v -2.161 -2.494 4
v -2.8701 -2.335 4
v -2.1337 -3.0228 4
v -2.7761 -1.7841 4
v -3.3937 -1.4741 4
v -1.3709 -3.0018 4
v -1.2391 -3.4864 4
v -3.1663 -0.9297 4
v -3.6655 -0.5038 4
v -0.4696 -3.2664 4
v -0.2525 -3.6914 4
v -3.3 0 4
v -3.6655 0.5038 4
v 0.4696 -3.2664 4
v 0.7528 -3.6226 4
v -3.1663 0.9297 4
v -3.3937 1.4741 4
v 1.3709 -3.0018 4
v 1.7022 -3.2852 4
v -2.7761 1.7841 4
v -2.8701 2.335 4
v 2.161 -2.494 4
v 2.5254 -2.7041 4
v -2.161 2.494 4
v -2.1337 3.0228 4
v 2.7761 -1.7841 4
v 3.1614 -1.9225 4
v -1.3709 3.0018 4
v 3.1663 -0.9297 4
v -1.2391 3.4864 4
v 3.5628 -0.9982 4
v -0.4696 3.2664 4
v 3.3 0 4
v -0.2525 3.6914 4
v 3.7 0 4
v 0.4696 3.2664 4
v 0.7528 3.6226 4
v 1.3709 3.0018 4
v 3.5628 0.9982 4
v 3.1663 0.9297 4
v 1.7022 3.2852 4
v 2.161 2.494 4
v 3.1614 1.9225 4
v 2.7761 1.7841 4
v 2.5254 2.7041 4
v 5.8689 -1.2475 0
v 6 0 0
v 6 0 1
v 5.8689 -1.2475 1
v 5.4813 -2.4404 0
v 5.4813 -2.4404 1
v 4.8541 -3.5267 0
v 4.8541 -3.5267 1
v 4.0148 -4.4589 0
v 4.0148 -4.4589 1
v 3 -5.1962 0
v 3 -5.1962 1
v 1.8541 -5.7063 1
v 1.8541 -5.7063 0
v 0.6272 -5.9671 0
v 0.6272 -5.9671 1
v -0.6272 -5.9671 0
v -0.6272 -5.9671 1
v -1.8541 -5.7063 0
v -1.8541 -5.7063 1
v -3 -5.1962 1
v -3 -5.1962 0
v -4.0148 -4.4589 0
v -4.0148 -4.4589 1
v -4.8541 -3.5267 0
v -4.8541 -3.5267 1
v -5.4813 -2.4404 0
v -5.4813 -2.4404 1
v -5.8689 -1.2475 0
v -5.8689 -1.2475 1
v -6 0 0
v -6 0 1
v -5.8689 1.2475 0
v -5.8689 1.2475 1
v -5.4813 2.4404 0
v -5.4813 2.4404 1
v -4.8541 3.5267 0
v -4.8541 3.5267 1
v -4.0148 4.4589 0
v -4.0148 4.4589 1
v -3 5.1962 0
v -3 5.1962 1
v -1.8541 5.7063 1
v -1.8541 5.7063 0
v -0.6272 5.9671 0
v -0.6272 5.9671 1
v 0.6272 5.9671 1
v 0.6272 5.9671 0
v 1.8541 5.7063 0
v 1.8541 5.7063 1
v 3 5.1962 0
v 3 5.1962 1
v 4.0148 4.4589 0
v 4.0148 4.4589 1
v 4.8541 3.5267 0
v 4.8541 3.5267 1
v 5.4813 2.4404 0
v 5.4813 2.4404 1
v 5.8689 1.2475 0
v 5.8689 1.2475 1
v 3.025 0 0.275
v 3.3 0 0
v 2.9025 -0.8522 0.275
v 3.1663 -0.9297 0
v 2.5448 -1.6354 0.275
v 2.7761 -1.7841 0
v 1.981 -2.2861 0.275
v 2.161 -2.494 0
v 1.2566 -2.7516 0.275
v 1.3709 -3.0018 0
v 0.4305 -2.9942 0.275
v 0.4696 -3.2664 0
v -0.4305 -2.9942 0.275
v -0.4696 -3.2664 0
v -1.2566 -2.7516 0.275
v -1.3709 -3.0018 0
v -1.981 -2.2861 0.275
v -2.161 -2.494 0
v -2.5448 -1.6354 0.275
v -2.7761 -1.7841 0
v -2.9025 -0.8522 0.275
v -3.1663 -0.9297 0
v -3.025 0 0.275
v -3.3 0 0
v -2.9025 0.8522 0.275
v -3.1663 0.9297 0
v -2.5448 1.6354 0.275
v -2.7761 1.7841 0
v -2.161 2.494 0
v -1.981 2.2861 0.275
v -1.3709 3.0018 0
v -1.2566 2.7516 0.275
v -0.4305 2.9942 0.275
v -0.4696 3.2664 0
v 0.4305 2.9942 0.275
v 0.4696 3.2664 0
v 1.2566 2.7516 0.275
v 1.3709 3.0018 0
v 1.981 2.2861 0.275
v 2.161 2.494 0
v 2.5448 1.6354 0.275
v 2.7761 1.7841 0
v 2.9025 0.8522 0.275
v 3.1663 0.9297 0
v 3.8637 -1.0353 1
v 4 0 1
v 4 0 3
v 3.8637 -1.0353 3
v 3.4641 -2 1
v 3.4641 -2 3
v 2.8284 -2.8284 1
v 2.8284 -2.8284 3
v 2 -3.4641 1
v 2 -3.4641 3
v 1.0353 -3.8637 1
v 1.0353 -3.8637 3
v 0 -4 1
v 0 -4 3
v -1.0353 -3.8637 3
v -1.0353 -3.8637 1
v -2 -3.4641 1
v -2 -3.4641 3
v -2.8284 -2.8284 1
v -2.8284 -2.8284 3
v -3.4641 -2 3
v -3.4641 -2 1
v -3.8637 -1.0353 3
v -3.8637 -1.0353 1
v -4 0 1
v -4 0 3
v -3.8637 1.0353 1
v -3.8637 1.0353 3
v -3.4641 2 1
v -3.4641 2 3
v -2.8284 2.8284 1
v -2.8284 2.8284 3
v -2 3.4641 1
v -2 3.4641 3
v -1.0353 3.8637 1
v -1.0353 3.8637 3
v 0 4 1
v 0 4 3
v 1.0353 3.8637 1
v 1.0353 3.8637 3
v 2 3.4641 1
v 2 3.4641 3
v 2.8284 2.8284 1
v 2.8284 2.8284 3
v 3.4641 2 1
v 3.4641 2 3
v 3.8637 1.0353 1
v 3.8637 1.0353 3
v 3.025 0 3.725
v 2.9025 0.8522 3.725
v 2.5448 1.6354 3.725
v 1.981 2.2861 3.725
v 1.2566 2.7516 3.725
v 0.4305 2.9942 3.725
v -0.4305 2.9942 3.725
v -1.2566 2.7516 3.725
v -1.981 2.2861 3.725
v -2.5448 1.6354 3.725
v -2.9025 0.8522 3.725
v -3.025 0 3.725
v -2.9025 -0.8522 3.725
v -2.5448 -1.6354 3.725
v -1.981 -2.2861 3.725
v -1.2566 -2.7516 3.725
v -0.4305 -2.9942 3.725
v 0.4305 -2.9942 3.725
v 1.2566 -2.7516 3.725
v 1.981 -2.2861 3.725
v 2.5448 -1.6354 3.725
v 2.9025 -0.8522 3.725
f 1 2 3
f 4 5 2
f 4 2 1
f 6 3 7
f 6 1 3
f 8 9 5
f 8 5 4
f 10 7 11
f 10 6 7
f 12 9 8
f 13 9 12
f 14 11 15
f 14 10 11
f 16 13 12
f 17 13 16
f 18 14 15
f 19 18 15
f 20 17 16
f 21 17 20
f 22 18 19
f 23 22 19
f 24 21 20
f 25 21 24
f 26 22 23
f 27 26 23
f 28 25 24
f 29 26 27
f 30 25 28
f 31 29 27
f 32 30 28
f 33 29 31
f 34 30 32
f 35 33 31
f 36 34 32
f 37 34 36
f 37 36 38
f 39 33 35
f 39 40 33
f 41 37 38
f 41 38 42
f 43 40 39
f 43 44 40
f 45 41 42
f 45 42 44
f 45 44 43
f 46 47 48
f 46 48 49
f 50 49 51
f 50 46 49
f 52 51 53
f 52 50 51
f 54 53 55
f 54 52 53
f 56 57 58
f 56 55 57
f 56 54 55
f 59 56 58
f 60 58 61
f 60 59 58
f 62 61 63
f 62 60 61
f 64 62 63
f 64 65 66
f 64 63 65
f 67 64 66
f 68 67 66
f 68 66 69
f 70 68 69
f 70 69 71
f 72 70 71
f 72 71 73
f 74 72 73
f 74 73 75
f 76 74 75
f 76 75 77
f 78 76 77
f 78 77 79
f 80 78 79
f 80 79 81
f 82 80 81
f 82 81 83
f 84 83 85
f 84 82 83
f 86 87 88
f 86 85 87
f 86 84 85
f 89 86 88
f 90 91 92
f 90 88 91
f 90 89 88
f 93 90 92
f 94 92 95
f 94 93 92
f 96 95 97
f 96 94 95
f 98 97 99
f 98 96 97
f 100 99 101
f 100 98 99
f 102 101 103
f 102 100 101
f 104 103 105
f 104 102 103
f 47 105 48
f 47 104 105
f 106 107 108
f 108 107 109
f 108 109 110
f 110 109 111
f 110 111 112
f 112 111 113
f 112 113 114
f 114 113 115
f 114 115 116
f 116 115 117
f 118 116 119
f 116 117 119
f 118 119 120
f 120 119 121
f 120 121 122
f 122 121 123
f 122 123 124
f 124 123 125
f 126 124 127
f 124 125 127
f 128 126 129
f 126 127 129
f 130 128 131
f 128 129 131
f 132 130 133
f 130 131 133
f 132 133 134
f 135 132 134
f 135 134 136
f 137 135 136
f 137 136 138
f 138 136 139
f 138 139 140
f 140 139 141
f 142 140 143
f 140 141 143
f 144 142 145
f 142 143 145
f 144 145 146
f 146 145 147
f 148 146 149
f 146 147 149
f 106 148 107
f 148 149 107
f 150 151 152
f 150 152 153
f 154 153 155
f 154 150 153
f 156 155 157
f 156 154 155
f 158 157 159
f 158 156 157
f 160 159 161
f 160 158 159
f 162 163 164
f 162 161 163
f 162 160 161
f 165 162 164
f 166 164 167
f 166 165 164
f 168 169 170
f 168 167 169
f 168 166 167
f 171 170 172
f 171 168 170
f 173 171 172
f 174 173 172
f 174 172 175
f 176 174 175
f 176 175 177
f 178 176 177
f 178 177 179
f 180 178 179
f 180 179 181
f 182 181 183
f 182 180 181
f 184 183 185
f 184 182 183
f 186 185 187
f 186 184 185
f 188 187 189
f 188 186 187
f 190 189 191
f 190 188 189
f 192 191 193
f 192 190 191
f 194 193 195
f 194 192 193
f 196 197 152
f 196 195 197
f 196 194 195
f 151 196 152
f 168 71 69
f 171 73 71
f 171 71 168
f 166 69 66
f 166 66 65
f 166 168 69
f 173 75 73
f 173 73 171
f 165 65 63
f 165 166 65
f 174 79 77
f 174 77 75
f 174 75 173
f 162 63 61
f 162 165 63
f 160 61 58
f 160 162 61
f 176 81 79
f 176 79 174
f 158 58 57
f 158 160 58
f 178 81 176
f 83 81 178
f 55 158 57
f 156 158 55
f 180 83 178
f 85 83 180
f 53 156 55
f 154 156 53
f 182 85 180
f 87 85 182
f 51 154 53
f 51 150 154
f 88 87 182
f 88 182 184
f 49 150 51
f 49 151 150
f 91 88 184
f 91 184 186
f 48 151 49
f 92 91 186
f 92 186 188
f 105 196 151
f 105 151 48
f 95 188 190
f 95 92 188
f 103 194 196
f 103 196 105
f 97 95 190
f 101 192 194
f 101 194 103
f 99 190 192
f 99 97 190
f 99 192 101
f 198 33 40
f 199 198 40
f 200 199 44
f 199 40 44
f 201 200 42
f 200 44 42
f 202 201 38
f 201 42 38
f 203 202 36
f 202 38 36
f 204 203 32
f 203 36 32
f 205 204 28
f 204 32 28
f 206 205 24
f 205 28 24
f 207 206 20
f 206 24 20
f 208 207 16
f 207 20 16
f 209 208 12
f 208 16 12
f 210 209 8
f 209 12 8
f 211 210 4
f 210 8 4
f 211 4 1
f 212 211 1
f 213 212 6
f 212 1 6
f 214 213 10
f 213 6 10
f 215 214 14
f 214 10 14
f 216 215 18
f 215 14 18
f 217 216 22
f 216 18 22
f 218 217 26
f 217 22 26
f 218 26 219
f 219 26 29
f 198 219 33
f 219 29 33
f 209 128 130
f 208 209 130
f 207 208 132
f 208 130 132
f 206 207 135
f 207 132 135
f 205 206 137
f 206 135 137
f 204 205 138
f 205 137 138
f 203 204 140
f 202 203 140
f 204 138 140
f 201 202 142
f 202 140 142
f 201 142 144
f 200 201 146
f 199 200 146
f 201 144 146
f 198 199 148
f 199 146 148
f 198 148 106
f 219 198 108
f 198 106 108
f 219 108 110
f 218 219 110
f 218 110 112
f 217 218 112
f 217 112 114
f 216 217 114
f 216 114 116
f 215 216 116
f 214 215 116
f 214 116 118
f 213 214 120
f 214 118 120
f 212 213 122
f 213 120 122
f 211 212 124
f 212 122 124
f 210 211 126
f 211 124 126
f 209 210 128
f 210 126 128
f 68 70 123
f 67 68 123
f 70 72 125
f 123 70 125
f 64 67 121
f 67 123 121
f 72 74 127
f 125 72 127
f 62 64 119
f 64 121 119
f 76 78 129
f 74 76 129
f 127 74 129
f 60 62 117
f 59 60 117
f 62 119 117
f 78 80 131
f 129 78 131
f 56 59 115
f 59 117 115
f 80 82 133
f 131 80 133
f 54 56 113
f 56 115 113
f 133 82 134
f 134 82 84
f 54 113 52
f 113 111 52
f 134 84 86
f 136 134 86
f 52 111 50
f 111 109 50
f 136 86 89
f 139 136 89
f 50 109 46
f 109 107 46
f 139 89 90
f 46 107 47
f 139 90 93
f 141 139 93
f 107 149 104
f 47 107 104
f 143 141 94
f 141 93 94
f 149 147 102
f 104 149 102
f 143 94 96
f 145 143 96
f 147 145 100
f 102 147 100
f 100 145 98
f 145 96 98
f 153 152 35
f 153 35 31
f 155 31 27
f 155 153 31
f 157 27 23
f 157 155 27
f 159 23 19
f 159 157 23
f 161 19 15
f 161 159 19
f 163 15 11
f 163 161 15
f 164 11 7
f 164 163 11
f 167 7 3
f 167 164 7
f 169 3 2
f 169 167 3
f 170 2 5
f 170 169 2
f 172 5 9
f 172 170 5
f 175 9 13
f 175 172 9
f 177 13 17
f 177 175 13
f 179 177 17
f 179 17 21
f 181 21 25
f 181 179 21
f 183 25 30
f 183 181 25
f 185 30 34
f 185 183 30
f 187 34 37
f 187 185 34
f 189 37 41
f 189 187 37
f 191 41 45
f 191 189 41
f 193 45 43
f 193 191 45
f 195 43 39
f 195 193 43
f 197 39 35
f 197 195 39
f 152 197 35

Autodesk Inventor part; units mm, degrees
ref_plane "YZ Plane" through (0, 0, 0) normal (1, 0, 0) x (0, 1, 0)
ref_plane "XZ Plane" through (0, 0, 0) normal (0, 1, 0) x (-1, 0, 0)
ref_plane "XY Plane" through (0, 0, 0) normal (0, 0, 1) x (1, 0, 0)
sketch "スケッチ1" plane through (0, 0, 0) normal (0, 1, 0) x (-1, 0, 0)
  line L0 (-3, 0.3) -> (-3, 3.7)
  line L1 (-3.3, 4) -> (-3.7, 4)
  line L2 (-4, 3) -> (-4, 1)
  line L3 (-4, 1) -> (-6, 1)
  line L4 (-6, 1) -> (-6, 0)
  line L5 (-6, 0) -> (-3.3, 0)
  line L6 (-3, 3.7) -> (-3.3, 4)
  line L7 (-3, 0.3) -> (-3.3, 0)
  line L8 (-3.7, 4) -> (-4, 3)
  line L9 (0, -0.8) -> (0, 4.8) projected
  point P0 (0, 0)
  point P1 (-3, 0)
  point P2 (-3, 4)
  point P3 (-4, 4)
  dimension "d2" = 1
  dimension "d9" = 1
  dimension "d11" = 6
  dimension "d12" = 8
  dimension "d13" = 12
  dimension "d14" = 0.3
  dimension "d15" = 0.3
  dimension "d16" = 0.3
  dimension "d17" = 0.3
  dimension "d18" = 0.3
  dimension "d19" = 4
revolve "回転1" add sketch "スケッチ1" angle 360 about axis through (0, 0, -10) along (0, 0, 1)
sketch "스케치2" plane through (0, 0, 0) normal (0, 0, -1) x (-1, 0, 0)
  circle A0 centre (0, 0) radius 3.3 projected
  circle A1 centre (0, 0) radius 6 projected
  circle A2 centre (0, 0) radius 3.025
  dimension "d20" = 6.05
extrude "돌출1" cut sketch "스케치2" against normal up to surface (4 mm away) contours A2
equation "\"d15\" = d14"
equation "\"d16\" = d14"
equation "\"d17\" = d16"
equation "\"d18\" = d14"
properties part number "80F-0603"
